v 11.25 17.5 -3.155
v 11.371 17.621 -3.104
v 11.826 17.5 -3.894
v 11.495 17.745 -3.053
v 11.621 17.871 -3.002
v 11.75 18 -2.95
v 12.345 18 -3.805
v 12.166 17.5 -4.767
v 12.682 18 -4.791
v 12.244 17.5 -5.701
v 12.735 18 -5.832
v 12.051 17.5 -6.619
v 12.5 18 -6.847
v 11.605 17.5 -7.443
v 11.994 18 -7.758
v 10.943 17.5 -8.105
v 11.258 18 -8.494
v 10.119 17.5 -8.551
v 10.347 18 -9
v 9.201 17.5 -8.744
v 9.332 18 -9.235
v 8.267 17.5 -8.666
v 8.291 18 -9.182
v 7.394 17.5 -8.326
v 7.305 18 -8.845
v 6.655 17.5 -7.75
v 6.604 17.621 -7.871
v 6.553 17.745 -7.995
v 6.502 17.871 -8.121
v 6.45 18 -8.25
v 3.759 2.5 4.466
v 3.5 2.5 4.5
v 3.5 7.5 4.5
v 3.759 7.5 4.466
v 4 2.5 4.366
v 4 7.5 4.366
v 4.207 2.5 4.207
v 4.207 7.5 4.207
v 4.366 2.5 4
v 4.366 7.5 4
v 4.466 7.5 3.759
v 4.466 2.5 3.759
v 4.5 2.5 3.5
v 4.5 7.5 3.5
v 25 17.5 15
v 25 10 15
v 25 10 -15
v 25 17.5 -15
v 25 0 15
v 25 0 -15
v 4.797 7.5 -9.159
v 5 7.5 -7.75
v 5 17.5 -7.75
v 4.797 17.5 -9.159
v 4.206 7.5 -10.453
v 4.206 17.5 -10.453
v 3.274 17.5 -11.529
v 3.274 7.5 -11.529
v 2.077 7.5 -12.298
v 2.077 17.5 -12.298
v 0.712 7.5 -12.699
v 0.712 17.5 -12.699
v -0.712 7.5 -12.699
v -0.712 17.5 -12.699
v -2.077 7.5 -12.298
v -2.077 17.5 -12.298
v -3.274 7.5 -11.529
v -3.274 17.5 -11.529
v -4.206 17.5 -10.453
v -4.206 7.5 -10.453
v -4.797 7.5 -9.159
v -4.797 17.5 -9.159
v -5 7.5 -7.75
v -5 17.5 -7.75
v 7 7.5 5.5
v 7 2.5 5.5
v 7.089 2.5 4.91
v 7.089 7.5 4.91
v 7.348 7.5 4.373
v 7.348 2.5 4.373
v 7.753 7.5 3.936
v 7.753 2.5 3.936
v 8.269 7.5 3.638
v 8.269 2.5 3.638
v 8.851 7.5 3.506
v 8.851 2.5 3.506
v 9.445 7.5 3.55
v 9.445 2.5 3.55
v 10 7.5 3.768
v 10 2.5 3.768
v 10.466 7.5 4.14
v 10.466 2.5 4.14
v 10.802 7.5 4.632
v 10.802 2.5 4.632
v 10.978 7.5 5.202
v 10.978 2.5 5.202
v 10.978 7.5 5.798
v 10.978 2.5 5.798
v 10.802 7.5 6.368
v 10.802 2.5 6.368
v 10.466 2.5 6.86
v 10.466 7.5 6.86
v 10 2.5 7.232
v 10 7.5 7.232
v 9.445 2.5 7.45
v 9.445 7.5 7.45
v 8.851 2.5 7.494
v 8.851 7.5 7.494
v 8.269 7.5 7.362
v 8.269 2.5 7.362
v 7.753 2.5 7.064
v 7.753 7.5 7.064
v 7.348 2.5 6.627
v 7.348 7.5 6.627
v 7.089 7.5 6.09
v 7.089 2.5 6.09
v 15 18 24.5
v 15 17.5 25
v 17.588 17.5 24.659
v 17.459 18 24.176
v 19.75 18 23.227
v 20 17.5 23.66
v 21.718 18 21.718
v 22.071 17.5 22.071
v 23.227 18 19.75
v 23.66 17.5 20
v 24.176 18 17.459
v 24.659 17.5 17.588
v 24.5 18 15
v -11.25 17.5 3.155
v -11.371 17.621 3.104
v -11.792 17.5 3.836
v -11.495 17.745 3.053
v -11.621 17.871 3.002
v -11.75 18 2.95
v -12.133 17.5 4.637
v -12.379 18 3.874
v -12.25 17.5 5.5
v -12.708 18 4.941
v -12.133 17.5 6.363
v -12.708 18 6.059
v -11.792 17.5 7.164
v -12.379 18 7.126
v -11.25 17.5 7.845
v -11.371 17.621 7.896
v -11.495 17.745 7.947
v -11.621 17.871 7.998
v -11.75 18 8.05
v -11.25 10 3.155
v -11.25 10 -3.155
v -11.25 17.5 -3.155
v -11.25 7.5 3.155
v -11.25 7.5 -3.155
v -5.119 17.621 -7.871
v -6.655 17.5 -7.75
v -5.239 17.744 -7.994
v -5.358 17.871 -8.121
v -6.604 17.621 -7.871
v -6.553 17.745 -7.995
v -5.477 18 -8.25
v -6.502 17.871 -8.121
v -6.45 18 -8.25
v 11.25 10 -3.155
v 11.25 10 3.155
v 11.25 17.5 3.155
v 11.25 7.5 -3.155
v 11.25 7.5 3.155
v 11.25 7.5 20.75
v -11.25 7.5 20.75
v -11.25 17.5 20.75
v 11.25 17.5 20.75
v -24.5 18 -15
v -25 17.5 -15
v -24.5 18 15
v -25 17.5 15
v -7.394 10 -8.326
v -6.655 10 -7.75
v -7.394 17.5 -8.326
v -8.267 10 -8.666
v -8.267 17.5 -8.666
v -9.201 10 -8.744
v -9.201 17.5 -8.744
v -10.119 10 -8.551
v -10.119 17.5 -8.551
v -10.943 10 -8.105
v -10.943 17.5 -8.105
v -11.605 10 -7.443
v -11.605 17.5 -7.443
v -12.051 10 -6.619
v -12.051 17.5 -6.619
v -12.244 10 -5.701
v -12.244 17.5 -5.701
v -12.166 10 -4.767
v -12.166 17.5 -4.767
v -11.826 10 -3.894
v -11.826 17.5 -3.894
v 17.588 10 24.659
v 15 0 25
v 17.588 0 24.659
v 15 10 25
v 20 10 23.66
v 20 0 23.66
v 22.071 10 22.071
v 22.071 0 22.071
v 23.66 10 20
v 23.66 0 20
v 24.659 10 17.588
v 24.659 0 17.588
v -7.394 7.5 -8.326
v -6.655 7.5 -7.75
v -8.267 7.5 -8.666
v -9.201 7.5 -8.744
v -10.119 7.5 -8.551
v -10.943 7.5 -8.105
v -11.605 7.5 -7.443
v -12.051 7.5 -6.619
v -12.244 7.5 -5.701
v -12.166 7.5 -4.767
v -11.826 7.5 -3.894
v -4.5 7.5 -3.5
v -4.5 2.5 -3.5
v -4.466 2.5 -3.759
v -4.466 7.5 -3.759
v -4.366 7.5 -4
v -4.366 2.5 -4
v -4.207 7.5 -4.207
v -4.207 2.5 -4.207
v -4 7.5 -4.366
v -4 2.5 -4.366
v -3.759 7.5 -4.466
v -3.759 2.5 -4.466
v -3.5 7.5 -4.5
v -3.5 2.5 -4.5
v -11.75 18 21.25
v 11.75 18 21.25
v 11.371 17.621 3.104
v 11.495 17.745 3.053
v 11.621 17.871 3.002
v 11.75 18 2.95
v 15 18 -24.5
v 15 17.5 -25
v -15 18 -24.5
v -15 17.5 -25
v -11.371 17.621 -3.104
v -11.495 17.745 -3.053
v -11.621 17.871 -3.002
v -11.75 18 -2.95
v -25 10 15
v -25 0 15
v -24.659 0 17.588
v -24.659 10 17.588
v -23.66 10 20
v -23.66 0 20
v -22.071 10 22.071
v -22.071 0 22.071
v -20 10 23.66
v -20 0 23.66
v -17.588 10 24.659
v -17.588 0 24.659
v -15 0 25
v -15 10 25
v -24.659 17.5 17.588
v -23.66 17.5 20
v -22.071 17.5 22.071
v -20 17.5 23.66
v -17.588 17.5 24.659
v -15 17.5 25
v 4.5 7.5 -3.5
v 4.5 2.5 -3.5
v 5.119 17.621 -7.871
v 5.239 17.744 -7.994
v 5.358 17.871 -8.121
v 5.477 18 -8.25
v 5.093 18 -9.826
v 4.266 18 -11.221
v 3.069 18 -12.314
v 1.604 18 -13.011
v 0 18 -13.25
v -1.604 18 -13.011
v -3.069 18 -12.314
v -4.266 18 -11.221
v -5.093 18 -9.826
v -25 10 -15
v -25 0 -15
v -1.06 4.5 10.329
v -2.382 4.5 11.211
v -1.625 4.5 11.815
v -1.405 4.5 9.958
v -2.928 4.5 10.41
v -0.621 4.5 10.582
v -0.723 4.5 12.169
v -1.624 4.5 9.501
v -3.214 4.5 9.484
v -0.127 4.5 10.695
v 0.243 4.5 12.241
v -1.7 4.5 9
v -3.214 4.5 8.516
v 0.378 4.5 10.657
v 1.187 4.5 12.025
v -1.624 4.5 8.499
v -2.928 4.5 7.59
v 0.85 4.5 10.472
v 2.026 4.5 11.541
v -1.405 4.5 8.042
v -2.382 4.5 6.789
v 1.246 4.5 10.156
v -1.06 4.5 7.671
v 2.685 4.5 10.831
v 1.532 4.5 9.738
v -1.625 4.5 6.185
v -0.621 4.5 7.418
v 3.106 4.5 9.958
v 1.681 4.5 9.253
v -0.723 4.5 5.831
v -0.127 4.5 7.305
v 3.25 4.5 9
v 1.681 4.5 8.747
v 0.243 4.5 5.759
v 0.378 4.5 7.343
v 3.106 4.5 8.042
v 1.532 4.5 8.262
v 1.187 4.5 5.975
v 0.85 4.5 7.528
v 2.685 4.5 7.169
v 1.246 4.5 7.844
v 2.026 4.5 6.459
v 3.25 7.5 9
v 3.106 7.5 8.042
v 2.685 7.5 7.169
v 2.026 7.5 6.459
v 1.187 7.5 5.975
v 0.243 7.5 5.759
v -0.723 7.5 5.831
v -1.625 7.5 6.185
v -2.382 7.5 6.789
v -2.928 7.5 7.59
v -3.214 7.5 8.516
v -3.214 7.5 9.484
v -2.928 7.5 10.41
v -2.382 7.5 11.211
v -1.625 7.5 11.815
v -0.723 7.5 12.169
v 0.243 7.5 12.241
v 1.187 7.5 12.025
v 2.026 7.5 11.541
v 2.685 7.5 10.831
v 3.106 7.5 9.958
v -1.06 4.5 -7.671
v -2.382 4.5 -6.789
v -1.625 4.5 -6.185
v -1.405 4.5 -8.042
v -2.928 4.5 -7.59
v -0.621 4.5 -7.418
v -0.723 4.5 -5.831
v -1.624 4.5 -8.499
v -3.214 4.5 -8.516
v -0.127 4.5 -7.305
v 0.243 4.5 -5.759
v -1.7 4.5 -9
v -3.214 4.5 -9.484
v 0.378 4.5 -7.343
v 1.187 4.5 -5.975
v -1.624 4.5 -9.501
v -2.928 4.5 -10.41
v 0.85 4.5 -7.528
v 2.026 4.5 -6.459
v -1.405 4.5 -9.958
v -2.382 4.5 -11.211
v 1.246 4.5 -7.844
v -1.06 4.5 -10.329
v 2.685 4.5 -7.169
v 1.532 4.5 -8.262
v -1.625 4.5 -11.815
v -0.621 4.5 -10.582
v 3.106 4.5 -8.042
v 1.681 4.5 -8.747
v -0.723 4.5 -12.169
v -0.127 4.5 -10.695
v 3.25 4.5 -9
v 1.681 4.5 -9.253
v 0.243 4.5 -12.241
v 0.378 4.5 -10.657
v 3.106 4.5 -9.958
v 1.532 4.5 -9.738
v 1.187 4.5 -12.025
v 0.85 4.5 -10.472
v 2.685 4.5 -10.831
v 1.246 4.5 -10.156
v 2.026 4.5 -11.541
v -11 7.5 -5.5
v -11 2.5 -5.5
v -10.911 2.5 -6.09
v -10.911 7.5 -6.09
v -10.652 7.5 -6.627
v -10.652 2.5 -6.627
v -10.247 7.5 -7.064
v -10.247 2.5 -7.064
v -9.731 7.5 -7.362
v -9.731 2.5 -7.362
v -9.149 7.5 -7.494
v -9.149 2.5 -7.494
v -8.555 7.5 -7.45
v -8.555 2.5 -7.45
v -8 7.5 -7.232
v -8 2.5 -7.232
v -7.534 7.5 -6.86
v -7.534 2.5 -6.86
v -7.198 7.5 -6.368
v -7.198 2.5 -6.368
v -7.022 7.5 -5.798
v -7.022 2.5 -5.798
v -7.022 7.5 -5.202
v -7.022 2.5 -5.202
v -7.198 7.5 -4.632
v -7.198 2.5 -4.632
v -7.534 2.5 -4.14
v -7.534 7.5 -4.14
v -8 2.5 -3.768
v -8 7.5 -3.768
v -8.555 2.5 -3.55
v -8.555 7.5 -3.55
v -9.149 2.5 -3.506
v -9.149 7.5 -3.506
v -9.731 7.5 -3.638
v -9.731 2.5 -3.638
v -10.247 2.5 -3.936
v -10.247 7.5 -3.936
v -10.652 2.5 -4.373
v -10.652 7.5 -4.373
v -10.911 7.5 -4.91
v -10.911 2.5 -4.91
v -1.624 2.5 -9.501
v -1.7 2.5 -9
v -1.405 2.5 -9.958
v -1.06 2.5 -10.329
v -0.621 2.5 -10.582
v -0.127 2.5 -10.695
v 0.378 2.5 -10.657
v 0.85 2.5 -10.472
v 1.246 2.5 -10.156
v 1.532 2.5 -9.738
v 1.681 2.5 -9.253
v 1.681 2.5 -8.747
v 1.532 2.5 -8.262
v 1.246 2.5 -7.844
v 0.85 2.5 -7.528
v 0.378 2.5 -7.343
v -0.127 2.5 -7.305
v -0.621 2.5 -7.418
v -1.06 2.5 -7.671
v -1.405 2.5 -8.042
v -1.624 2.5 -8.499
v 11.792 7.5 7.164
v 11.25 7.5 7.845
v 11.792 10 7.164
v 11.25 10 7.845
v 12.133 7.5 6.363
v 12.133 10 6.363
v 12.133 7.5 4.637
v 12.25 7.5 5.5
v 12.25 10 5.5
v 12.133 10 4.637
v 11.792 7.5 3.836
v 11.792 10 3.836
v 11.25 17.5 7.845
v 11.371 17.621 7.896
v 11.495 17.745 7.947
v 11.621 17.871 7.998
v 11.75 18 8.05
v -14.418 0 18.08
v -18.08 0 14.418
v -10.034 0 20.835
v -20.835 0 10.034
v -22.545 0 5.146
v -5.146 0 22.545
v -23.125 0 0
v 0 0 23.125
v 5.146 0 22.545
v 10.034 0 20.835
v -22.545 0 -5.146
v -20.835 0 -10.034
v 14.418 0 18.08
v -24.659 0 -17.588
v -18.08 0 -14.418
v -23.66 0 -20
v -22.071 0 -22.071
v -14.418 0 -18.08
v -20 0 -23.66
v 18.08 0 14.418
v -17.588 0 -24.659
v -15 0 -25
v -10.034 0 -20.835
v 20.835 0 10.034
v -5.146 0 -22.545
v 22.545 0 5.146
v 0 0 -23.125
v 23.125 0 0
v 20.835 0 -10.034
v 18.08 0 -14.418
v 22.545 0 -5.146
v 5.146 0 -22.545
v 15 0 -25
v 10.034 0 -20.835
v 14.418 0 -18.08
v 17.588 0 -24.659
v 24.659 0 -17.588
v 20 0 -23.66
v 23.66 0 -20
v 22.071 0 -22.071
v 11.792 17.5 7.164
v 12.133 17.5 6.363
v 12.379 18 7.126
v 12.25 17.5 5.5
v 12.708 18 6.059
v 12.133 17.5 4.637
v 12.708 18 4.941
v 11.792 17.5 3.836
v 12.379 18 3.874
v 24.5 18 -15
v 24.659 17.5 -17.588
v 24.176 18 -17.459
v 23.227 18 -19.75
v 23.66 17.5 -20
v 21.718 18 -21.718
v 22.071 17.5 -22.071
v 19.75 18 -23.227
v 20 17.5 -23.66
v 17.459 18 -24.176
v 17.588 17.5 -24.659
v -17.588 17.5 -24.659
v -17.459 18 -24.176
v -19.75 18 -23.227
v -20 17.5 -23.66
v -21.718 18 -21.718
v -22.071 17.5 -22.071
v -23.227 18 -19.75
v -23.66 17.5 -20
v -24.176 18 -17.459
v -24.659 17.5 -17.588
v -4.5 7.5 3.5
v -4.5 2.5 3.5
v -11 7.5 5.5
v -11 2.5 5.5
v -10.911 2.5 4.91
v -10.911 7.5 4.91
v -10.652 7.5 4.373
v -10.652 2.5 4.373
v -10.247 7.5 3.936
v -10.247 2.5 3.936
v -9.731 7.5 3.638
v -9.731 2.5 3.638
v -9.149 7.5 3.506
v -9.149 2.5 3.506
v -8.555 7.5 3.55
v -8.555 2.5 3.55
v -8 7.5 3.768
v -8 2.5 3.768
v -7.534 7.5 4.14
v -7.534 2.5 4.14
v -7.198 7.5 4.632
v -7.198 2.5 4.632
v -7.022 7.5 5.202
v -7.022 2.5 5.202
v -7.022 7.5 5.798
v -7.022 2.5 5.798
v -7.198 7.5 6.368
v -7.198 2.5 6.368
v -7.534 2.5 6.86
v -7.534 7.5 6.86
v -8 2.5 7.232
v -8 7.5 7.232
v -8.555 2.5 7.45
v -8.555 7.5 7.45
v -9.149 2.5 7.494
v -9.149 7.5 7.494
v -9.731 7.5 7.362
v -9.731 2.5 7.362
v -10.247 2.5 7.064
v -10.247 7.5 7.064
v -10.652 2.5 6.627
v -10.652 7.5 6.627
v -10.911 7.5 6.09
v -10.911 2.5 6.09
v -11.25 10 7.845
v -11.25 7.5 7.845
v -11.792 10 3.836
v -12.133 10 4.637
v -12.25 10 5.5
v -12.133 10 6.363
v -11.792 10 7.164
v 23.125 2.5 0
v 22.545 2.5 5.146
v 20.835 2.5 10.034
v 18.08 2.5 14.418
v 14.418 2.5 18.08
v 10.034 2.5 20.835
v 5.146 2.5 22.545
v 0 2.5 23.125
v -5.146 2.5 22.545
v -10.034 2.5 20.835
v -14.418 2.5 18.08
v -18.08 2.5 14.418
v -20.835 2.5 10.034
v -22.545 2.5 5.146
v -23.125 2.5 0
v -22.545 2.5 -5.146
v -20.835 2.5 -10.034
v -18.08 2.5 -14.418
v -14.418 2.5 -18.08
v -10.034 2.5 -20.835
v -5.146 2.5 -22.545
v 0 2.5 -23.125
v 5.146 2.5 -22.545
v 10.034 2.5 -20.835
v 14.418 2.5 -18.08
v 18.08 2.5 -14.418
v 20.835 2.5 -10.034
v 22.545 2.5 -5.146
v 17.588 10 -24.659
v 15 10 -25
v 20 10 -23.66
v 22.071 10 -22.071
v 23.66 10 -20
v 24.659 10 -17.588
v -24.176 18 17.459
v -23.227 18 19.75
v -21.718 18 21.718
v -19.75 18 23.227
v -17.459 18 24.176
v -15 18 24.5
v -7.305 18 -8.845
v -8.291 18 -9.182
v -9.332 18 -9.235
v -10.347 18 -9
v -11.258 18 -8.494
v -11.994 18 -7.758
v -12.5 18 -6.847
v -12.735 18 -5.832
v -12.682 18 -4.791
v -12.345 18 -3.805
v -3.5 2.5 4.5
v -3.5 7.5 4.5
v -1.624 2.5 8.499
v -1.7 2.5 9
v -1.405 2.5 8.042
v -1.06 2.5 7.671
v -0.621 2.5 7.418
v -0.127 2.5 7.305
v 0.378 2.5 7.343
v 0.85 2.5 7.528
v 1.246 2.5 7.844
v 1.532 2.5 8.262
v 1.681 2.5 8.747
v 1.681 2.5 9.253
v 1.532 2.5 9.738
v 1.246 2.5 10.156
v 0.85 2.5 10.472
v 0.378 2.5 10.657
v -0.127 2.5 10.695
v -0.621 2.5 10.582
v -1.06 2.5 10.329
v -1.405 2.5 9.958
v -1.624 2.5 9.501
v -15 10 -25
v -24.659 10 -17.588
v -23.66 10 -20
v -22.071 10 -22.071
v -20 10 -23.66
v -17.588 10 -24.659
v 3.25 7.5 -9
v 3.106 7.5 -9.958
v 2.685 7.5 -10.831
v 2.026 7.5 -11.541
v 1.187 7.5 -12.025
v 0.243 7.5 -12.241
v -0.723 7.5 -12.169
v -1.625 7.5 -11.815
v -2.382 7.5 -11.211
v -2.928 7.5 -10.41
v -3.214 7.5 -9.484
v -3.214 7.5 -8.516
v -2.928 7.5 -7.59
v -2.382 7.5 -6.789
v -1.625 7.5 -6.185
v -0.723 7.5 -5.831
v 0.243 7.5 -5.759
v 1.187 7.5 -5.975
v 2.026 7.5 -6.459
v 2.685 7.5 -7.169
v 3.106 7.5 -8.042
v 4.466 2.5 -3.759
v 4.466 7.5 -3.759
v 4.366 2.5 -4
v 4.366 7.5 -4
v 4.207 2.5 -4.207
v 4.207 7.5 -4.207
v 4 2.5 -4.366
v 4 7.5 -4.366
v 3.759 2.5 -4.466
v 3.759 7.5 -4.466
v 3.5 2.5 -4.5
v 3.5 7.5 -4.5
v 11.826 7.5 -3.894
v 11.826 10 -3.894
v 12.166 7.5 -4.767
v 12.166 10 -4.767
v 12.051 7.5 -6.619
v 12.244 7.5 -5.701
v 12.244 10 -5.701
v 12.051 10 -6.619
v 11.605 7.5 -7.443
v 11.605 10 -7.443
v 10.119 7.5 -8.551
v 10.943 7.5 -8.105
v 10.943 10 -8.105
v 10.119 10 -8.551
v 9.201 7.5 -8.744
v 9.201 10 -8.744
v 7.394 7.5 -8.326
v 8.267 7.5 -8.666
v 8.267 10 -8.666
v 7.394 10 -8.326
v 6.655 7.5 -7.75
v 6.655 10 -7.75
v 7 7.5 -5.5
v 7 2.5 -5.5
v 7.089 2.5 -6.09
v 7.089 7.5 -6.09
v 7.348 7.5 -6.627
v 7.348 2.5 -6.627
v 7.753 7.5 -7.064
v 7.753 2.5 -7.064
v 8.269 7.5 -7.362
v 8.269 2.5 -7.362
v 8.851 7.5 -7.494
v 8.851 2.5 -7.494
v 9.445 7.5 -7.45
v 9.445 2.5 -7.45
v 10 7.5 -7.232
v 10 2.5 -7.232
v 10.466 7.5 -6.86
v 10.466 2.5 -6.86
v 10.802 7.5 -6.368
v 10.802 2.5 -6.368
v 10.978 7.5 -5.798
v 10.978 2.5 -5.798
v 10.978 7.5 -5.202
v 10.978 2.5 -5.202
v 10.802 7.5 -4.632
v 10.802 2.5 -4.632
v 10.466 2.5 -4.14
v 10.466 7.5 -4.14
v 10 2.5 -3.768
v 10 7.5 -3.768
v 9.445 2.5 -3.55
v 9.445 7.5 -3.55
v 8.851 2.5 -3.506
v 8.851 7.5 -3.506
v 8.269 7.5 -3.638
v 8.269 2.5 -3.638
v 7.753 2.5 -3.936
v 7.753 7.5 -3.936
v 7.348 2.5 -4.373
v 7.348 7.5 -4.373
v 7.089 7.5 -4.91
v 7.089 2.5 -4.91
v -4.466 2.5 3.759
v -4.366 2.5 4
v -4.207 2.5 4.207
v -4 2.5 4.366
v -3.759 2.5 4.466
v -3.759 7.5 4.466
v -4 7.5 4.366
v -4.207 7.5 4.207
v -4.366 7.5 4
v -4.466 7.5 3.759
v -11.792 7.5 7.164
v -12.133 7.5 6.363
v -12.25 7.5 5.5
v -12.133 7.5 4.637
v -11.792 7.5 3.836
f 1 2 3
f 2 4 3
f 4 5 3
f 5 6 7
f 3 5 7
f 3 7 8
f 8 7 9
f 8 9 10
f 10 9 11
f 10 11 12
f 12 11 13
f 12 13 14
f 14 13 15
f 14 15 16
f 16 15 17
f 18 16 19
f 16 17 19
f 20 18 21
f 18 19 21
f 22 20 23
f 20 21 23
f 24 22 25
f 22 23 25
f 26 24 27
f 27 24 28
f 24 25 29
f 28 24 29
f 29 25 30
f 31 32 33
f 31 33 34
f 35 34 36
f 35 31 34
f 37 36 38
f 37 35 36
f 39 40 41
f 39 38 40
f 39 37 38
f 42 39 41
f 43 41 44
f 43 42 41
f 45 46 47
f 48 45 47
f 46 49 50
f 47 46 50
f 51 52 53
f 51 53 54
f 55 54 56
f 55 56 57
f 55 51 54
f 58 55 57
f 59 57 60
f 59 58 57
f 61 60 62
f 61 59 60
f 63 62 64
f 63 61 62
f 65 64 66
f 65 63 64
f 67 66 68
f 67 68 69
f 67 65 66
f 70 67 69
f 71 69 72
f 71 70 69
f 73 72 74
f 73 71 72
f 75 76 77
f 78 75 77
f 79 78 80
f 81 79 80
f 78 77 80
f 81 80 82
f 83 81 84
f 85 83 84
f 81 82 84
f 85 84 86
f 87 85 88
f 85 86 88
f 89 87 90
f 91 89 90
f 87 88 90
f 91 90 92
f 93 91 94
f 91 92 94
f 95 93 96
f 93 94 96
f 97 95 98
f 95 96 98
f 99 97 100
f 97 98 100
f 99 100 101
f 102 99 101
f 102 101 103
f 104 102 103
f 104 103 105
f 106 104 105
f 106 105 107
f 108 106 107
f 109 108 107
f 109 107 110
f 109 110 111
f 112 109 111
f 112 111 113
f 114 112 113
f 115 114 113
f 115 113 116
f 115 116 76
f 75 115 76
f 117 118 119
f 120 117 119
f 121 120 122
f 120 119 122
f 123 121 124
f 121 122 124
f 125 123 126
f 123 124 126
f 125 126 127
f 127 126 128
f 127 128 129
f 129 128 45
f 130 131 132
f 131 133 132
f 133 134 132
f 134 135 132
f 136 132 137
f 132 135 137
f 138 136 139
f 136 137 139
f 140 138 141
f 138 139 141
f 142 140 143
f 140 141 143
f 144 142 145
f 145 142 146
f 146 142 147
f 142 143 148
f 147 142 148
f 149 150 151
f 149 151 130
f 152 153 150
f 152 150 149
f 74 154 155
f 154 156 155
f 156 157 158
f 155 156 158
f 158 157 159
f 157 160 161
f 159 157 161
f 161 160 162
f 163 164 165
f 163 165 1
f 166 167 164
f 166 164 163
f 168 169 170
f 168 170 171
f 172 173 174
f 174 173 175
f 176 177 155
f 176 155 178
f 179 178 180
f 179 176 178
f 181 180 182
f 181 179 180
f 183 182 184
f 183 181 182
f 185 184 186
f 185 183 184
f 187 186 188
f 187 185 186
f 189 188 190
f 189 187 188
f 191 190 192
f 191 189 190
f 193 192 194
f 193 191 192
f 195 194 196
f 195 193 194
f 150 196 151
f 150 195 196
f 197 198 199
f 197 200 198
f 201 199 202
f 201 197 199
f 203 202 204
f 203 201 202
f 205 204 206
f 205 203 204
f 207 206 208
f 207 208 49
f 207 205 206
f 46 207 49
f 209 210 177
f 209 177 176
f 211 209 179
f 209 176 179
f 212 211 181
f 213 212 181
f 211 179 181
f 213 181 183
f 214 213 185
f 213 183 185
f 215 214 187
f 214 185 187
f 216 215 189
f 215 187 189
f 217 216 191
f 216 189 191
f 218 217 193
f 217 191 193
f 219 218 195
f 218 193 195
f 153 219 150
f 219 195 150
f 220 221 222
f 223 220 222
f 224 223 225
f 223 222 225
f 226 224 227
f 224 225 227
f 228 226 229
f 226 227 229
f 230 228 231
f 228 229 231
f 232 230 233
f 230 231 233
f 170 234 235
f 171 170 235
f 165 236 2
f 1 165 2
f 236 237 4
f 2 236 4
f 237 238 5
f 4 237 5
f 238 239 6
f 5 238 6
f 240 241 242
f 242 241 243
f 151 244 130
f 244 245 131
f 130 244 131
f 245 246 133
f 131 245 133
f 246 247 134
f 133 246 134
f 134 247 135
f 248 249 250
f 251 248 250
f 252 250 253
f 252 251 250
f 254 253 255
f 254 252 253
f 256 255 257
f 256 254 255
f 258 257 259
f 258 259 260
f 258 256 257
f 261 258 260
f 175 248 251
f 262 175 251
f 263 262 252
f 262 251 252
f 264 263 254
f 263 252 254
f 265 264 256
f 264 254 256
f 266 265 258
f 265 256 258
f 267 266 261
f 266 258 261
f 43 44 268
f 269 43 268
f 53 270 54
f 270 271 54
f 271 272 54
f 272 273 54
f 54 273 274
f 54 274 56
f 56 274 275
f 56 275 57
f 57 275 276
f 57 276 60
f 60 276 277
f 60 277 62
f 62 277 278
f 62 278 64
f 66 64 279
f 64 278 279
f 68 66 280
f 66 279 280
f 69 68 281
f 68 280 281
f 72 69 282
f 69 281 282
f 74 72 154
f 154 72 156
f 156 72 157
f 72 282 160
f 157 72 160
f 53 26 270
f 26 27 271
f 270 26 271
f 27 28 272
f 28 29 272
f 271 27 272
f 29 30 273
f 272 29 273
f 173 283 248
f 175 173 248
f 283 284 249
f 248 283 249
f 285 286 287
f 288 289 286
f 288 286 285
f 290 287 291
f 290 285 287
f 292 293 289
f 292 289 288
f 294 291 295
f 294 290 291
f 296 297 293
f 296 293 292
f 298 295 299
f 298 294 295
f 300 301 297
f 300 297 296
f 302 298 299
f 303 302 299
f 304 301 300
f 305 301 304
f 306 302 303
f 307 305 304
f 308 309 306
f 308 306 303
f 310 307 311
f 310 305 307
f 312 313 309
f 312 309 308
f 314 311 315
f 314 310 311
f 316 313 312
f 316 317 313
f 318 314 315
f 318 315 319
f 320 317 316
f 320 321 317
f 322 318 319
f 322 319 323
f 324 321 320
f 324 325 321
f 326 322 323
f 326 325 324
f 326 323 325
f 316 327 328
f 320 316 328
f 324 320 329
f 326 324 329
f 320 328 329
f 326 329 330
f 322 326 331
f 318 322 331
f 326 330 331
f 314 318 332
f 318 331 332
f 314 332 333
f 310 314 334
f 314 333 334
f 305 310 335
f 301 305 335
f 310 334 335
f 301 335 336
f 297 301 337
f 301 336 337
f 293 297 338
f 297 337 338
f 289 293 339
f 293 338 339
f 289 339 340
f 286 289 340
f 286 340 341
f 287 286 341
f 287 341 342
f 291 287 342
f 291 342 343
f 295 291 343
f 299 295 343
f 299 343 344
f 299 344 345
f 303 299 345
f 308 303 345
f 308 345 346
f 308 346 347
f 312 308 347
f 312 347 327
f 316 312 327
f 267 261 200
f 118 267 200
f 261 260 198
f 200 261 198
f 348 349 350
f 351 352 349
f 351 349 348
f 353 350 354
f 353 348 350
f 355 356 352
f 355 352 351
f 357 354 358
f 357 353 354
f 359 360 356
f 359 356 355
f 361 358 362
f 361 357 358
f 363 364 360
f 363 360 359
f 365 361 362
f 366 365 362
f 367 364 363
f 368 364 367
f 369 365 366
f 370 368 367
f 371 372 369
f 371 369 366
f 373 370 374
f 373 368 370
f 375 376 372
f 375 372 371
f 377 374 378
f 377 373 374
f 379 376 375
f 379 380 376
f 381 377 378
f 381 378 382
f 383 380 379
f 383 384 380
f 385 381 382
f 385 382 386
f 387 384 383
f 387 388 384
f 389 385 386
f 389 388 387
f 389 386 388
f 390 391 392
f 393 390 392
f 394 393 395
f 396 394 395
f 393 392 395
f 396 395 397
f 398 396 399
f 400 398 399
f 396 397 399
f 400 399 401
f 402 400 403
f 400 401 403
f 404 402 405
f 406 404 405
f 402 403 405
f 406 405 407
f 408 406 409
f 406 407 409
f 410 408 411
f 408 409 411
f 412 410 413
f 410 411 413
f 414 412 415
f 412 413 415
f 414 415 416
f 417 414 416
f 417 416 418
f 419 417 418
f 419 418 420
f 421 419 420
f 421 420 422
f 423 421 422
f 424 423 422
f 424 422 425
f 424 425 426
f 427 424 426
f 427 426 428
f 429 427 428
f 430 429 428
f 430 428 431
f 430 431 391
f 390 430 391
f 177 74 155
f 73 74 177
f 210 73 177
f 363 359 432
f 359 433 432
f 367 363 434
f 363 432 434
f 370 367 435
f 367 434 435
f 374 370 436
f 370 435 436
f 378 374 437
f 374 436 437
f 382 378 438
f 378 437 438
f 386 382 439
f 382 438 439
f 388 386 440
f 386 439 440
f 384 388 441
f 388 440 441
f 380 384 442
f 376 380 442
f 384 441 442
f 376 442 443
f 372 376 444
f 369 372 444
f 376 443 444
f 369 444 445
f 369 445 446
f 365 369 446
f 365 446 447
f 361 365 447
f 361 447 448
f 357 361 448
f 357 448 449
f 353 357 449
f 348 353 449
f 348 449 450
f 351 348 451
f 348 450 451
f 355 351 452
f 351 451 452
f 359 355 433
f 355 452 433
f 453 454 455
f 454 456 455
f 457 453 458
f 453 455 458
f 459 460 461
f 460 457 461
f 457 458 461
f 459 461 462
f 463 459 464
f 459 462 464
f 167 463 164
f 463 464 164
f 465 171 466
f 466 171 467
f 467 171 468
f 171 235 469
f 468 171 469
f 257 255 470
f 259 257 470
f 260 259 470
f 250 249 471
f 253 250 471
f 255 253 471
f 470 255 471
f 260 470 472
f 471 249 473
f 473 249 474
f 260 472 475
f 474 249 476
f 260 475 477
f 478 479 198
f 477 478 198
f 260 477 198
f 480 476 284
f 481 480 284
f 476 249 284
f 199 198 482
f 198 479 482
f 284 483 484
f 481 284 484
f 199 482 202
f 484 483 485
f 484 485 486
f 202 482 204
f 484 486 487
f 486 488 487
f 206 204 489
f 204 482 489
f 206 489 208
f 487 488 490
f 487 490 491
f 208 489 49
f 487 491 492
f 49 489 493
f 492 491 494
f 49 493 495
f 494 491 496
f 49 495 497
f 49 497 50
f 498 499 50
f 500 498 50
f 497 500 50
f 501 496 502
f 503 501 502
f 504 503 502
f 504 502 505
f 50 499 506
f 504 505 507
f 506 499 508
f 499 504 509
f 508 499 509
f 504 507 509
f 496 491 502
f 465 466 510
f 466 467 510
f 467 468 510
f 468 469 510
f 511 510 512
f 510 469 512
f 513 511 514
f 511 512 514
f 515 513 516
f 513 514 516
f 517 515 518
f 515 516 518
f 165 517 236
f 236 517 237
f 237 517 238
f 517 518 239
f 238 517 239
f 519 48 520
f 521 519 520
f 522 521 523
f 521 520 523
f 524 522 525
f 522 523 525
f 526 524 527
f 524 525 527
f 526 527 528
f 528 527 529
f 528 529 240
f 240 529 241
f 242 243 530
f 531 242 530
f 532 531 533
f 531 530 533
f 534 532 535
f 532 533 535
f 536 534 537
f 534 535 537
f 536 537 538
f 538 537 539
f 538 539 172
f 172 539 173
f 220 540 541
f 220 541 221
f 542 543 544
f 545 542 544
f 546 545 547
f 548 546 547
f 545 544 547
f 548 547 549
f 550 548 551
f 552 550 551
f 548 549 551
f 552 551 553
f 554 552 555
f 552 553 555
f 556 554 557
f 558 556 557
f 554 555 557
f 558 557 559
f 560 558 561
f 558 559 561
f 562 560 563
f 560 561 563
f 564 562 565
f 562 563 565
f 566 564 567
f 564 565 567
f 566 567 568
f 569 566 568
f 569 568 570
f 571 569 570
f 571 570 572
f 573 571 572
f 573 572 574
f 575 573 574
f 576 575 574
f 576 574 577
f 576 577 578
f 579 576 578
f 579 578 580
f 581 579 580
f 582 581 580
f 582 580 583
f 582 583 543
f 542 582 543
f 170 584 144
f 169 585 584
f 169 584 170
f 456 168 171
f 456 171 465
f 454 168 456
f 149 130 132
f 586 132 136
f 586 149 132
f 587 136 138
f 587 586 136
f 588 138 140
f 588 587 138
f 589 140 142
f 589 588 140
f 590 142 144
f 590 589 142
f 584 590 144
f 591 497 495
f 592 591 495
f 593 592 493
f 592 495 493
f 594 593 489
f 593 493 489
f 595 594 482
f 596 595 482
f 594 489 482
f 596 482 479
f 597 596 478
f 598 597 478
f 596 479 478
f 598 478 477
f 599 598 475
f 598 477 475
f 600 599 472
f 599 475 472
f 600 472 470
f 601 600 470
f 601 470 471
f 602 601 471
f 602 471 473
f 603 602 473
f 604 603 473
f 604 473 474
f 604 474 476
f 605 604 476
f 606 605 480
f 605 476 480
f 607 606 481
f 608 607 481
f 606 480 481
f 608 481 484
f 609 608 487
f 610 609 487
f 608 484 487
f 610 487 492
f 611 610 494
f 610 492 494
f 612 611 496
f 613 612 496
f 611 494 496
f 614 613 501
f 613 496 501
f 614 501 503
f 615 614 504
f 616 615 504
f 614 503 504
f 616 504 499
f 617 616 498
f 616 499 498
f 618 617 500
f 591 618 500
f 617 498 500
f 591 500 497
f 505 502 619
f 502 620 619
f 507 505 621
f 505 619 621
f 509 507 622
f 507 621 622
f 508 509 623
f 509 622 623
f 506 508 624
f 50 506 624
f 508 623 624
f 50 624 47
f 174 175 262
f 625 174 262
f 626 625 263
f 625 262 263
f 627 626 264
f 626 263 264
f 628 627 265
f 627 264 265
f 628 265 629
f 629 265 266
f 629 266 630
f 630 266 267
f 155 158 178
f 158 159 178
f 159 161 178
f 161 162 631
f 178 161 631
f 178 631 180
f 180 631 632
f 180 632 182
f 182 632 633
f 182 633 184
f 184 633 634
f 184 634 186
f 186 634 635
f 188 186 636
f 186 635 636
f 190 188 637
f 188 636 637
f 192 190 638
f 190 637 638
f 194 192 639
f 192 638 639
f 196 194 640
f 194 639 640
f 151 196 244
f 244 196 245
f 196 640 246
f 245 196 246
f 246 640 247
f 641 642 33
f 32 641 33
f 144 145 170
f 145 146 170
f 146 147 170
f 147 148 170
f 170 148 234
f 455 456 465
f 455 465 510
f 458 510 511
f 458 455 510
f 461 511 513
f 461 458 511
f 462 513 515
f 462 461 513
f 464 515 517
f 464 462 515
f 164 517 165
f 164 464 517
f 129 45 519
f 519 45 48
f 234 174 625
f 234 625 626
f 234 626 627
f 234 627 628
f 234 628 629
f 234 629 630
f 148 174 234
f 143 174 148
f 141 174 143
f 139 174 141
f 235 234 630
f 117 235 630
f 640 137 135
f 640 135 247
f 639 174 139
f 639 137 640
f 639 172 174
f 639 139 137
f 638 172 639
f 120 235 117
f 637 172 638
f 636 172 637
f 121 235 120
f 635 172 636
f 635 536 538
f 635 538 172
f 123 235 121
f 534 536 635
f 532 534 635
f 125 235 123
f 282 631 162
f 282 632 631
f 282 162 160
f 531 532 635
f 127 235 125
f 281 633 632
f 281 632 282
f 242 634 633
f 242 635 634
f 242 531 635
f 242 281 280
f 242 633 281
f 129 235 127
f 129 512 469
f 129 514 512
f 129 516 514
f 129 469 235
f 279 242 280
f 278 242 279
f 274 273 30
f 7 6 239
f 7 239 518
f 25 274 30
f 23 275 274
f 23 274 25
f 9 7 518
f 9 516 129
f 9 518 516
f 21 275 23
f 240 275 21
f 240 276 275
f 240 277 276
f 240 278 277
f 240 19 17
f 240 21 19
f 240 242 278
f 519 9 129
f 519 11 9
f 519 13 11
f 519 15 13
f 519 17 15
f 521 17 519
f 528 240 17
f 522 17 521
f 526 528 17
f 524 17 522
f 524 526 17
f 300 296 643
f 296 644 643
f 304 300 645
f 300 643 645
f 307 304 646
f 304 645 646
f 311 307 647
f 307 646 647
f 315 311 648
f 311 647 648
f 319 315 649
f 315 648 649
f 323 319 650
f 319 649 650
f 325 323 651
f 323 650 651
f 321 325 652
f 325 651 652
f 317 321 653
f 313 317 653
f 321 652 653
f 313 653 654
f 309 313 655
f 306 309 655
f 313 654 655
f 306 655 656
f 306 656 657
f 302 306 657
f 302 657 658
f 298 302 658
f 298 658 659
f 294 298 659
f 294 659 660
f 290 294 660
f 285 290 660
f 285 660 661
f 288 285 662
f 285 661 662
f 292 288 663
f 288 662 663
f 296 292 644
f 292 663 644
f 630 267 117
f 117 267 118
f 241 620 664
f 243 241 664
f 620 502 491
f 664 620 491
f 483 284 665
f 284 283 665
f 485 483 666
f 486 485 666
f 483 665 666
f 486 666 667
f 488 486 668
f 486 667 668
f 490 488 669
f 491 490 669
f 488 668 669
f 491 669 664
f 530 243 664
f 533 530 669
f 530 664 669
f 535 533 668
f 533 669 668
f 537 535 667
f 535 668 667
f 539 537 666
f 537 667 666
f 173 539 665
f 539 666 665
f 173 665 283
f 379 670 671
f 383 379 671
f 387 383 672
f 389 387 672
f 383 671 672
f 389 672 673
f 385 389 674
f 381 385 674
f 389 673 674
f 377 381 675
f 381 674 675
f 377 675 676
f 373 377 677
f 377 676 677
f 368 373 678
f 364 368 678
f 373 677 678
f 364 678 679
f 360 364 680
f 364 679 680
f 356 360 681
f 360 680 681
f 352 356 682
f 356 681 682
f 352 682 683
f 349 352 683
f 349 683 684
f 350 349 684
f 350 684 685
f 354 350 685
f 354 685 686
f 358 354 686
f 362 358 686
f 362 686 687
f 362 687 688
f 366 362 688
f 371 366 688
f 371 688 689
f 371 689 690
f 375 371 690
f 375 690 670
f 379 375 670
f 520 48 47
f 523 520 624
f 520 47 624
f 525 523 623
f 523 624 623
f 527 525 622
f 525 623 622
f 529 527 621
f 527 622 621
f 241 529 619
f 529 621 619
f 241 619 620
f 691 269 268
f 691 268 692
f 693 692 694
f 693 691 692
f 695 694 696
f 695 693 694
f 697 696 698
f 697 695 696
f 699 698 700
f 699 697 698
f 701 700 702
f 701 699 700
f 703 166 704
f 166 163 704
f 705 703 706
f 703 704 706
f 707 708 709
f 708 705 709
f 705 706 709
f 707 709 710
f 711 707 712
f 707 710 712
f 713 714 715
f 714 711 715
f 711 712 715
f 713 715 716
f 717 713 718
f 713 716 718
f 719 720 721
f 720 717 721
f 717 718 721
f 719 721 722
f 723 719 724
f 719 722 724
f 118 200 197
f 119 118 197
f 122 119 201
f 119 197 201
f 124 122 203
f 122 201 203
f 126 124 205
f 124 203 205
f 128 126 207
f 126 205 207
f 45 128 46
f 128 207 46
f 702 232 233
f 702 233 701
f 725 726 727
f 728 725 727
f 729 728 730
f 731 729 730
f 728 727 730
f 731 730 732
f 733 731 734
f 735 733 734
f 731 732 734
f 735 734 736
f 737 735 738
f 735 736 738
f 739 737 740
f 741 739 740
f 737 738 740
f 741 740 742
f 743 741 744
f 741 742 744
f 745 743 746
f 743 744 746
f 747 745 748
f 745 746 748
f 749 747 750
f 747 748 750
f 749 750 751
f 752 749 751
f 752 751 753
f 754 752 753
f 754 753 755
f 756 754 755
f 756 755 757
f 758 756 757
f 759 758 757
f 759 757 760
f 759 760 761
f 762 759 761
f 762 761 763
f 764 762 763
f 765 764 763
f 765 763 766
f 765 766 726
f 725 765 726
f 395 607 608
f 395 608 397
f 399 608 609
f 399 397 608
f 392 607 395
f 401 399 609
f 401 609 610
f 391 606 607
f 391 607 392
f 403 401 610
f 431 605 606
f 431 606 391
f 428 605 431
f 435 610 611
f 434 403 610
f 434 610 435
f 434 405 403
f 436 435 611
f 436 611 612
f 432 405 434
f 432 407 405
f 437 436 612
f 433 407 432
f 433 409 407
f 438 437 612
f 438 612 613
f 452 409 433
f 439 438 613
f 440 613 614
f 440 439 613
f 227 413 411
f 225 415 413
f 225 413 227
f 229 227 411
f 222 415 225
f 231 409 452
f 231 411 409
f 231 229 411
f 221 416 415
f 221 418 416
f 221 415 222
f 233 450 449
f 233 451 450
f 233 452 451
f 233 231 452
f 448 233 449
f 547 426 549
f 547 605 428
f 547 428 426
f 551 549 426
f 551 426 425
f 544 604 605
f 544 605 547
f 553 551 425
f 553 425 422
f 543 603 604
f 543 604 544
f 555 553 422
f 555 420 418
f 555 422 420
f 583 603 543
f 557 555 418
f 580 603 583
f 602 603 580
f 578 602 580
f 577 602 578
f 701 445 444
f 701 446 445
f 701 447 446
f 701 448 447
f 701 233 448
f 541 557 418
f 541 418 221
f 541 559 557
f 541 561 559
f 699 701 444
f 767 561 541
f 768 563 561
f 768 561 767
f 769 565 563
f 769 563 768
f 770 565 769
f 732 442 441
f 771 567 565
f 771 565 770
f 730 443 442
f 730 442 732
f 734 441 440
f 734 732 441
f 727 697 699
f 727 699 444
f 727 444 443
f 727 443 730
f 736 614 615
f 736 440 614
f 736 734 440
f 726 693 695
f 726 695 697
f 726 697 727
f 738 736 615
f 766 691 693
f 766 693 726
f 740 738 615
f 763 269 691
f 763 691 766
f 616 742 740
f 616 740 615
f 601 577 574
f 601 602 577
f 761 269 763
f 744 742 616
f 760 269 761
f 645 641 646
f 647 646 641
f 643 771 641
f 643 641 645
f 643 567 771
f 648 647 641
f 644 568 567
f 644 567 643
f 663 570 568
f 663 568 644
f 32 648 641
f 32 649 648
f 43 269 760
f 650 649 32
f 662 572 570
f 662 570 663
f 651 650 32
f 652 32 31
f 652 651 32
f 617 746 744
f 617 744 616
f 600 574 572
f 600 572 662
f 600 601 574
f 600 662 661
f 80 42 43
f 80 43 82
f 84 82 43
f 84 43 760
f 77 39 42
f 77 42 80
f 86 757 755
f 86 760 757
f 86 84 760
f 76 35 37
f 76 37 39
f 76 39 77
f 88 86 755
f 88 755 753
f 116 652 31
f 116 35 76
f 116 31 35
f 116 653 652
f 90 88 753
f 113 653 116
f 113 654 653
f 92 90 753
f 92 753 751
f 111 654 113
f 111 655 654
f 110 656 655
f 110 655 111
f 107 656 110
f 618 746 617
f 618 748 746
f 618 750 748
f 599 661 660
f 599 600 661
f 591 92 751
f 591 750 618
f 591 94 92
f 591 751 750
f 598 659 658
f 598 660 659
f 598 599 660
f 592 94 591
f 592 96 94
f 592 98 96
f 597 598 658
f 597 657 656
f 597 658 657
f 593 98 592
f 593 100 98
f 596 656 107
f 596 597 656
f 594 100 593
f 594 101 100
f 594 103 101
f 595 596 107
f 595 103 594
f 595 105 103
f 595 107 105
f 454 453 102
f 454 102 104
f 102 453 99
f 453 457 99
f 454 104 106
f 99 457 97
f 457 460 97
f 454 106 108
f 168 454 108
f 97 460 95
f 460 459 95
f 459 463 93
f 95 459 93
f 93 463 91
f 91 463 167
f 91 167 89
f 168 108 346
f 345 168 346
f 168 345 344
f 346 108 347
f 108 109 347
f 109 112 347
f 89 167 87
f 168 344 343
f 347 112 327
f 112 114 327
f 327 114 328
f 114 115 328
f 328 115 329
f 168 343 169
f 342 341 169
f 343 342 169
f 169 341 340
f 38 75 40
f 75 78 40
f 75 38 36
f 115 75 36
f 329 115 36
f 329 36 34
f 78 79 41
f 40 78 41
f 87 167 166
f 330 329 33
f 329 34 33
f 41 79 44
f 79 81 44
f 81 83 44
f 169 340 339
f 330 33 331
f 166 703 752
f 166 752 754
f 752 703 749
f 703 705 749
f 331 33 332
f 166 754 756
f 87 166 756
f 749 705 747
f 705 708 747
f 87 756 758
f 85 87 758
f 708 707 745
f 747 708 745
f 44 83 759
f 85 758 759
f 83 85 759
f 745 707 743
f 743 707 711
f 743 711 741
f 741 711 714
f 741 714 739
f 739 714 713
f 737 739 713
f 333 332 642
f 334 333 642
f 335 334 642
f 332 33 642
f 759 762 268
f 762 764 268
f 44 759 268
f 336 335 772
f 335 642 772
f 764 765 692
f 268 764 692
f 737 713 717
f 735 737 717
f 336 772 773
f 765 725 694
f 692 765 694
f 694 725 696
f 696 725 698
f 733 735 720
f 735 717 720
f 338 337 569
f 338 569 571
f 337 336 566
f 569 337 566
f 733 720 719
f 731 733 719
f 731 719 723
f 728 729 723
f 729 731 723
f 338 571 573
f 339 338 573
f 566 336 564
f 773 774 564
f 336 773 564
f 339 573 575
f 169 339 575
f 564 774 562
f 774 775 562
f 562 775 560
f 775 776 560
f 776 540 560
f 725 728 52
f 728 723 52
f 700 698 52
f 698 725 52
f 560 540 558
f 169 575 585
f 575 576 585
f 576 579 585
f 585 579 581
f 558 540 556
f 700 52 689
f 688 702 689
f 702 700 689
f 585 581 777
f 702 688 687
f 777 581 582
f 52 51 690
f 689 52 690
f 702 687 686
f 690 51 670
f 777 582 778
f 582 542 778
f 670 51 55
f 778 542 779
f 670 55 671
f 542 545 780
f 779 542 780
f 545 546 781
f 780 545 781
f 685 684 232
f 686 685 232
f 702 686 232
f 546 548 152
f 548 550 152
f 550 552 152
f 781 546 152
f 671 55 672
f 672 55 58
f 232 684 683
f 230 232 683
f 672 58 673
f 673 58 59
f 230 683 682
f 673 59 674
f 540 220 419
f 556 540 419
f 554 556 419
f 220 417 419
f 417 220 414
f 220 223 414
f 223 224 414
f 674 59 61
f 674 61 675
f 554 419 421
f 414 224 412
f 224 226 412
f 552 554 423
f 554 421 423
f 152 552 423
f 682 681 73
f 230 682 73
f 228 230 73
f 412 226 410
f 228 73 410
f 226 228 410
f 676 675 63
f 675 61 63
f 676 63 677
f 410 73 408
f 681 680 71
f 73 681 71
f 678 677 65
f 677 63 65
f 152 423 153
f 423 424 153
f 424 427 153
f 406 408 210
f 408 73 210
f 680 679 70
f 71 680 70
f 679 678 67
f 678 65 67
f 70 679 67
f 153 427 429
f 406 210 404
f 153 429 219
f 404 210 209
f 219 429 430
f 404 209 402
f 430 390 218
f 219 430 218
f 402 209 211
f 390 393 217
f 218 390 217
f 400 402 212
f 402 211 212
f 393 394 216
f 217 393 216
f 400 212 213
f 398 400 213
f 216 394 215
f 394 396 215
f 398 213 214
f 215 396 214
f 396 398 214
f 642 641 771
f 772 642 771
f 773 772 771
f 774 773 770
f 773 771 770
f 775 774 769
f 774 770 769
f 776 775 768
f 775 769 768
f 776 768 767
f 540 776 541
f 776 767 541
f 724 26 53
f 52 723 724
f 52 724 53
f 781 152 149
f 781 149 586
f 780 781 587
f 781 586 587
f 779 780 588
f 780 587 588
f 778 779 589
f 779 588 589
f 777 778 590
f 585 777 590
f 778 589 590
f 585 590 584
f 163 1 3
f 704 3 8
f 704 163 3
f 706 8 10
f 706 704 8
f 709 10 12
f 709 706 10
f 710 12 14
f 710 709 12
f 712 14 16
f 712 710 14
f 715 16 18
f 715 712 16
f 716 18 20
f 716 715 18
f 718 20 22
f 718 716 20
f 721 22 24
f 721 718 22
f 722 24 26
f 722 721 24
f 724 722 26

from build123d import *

# Parameters (mm, degrees)
SKETCH2_W                      = 50
SKETCH2_H                      = 50
BOSS_EXTRUDE1_DEPTH            = 10
SKETCH3_W                      = 9
SKETCH3_H                      = 9
CUT_EXTRUDE1_DEPTH             = 10
SKETCH4_R                      = 23.125
CUT_EXTRUDE2_DEPTH             = 2.5
F_4_0MM_DOWEL_HOLE1_D          = 4
FILLET1_R                      = 1
FILLET2_R                      = 10
CUT_EXTRUDE3_DEPTH             = 2.5
CBORE_FOR_M3_SHCS2_D           = 3.4
CBORE_FOR_M3_SHCS2_CBORE_D     = 6.5
CBORE_FOR_M3_SHCS2_CBORE_DEPTH = 3
SKETCH21_R                     = 3.25
CUT_EXTRUDE5_DEPTH             = 2.5
BOSS_EXTRUDE2_DEPTH            = 8
CHAMFER1_SIZE                  = 0.5


with BuildPart() as part:
    # Sketch2 → Boss-Extrude1 (new body)
    with BuildSketch(Plane(origin=(0, 0, 0), x_dir=(1, 0, 0), z_dir=(0, 1, 0))):
        Rectangle(SKETCH2_W, SKETCH2_H)
    extrude(amount=BOSS_EXTRUDE1_DEPTH)

    # Sketch3 → Cut-Extrude1 (cut)
    with BuildSketch(Plane(origin=(0, 10, 0), x_dir=(1, 0, 0), z_dir=(0, 1, 0))):
        Rectangle(SKETCH3_W, SKETCH3_H)
    extrude(amount=-CUT_EXTRUDE1_DEPTH, mode=Mode.SUBTRACT)

    # Sketch4 → Cut-Extrude2 (cut)
    with BuildSketch(Plane.XZ):
        Circle(SKETCH4_R)
    extrude(amount=-CUT_EXTRUDE2_DEPTH, mode=Mode.SUBTRACT)

    # Ø4.0mm Dowel Hole1 (through all)
    with Locations(Plane(origin=(0, 10, 0), x_dir=(1, 0, 0), z_dir=(0, 1, 0))):
        with Locations((-9, 5.5), (9, 5.5), (9, -5.5), (-9, -5.5)):
            Hole(F_4_0MM_DOWEL_HOLE1_D / 2)

    # Fillet1
    fillet1_edges = [part.edges().sort_by_distance(p)[0] for p in [
        (4.5, 6.25, -4.5),
        (-4.5, 6.25, -4.5),
        (-4.5, 6.25, 4.5),
        (4.5, 6.25, 4.5),
    ]]
    fillet(fillet1_edges, radius=FILLET1_R)

    # Fillet2
    fillet2_edges = [part.edges().sort_by_distance(p)[0] for p in [
        (-25, 5, -25),
        (25, 5, -25),
        (25, 5, 25),
        (-25, 5, 25),
    ]]
    fillet(fillet2_edges, radius=FILLET2_R)

    # Sketch17 → Cut-Extrude3 (cut)
    with BuildSketch(Plane(origin=(0, 10, 0), x_dir=(1, 0, 0), z_dir=(0, 1, 0))):
        with BuildLine():
            Line((5, 7.75), (11.25, 7.75))
            Line((11.25, 7.75), (11.25, -20.75))
            Line((11.25, -20.75), (-11.25, -20.75))
            Line((-11.25, -20.75), (-11.25, 7.75))
            Line((-11.25, 7.75), (-5, 7.75))
            ThreePointArc((-5, 7.75), (0, 12.75), (5, 7.75))
        make_face()
    extrude(amount=-CUT_EXTRUDE3_DEPTH, mode=Mode.SUBTRACT)

    # CBORE for M3 SHCS2 (through all)
    with Locations(Plane(origin=(0, 7.5, 0), x_dir=(1, 0, 0), z_dir=(0, 1, 0))):
        with Locations((0, -9), (0, 9)):
            CounterBoreHole(CBORE_FOR_M3_SHCS2_D / 2, CBORE_FOR_M3_SHCS2_CBORE_D / 2, CBORE_FOR_M3_SHCS2_CBORE_DEPTH)

    # Sketch21 → Cut-Extrude5 (cut)
    with BuildSketch(Plane(origin=(0, 10, 0), x_dir=(1, 0, 0), z_dir=(0, 1, 0))):
        with Locations((-9, 5.5)):
            Circle(SKETCH21_R)
        with Locations((9, 5.5)):
            Circle(SKETCH21_R)
        with Locations((9, -5.5)):
            Circle(SKETCH21_R)
        with Locations((-9, -5.5)):
            Circle(SKETCH21_R)
    extrude(amount=-CUT_EXTRUDE5_DEPTH, mode=Mode.SUBTRACT)

    # Sketch22 → Boss-Extrude2 (add)
    with BuildSketch(Plane(origin=(0, 10, 0), x_dir=(1, 0, 0), z_dir=(0, 1, 0))):
        with BuildLine():
            Line((-15, -25), (15, -25))
            ThreePointArc((15, -25), (22.071067812, -22.071067812), (25, -15))
            Line((25, -15), (25, 15))
            ThreePointArc((25, 15), (22.071067812, 22.071067812), (15, 25))
            Line((15, 25), (-15, 25))
            ThreePointArc((-15, 25), (-22.071067812, 22.071067812), (-25, 15))
            Line((-25, 15), (-25, -15))
            ThreePointArc((-25, -15), (-22.071067812, -22.071067812), (-15, -25))
        make_face()
        with BuildLine():
            Line((-11.25, 3.15479212), (-11.25, -3.15479212))
            ThreePointArc((-11.25, -3.15479212), (-12.25, -5.5), (-11.25, -7.84520788))
            Line((-11.25, -7.84520788), (-11.25, -20.75))
            Line((-11.25, -20.75), (11.25, -20.75))
            Line((11.25, -20.75), (11.25, -7.84520788))
            ThreePointArc((11.25, -7.84520788), (12.25, -5.5), (11.25, -3.15479212))
            Line((11.25, -3.15479212), (11.25, 3.15479212))
            ThreePointArc((11.25, 3.15479212), (11.298097039, 7.798097039), (6.65479212, 7.75))
            Line((6.65479212, 7.75), (5, 7.75))
            ThreePointArc((5, 7.75), (0, 12.75), (-5, 7.75))
            Line((-5, 7.75), (-6.65479212, 7.75))
            ThreePointArc((-6.65479212, 7.75), (-11.298097039, 7.798097039), (-11.25, 3.15479212))
        make_face(mode=Mode.SUBTRACT)
    extrude(amount=BOSS_EXTRUDE2_DEPTH)

    # Chamfer1
    chamfer1_edges = [part.edges().sort_by_distance(p)[0] for p in [
        (-22.071067812, 18, 22.071067812),
        (0, 18, 25),
        (22.071067812, 18, 22.071067812),
        (25, 18, 0),
        (22.071067812, 18, -22.071067812),
        (0, 18, -25),
        (-22.071067812, 18, -22.071067812),
        (-25, 18, 0),
        (-11.298097039, 18, -7.798097039),
        (-11.25, 18, 0),
        (-12.25, 18, 5.5),
        (-11.25, 18, 14.29760394),
        (0, 18, 20.75),
        (11.25, 18, 14.29760394),
        (12.25, 18, 5.5),
        (11.25, 18, 0),
        (11.298097039, 18, -7.798097039),
        (5.82739606, 18, -7.75),
        (0, 18, -12.75),
        (-5.82739606, 18, -7.75),
    ]]
    chamfer(chamfer1_edges, length=CHAMFER1_SIZE)


solid = part.part
